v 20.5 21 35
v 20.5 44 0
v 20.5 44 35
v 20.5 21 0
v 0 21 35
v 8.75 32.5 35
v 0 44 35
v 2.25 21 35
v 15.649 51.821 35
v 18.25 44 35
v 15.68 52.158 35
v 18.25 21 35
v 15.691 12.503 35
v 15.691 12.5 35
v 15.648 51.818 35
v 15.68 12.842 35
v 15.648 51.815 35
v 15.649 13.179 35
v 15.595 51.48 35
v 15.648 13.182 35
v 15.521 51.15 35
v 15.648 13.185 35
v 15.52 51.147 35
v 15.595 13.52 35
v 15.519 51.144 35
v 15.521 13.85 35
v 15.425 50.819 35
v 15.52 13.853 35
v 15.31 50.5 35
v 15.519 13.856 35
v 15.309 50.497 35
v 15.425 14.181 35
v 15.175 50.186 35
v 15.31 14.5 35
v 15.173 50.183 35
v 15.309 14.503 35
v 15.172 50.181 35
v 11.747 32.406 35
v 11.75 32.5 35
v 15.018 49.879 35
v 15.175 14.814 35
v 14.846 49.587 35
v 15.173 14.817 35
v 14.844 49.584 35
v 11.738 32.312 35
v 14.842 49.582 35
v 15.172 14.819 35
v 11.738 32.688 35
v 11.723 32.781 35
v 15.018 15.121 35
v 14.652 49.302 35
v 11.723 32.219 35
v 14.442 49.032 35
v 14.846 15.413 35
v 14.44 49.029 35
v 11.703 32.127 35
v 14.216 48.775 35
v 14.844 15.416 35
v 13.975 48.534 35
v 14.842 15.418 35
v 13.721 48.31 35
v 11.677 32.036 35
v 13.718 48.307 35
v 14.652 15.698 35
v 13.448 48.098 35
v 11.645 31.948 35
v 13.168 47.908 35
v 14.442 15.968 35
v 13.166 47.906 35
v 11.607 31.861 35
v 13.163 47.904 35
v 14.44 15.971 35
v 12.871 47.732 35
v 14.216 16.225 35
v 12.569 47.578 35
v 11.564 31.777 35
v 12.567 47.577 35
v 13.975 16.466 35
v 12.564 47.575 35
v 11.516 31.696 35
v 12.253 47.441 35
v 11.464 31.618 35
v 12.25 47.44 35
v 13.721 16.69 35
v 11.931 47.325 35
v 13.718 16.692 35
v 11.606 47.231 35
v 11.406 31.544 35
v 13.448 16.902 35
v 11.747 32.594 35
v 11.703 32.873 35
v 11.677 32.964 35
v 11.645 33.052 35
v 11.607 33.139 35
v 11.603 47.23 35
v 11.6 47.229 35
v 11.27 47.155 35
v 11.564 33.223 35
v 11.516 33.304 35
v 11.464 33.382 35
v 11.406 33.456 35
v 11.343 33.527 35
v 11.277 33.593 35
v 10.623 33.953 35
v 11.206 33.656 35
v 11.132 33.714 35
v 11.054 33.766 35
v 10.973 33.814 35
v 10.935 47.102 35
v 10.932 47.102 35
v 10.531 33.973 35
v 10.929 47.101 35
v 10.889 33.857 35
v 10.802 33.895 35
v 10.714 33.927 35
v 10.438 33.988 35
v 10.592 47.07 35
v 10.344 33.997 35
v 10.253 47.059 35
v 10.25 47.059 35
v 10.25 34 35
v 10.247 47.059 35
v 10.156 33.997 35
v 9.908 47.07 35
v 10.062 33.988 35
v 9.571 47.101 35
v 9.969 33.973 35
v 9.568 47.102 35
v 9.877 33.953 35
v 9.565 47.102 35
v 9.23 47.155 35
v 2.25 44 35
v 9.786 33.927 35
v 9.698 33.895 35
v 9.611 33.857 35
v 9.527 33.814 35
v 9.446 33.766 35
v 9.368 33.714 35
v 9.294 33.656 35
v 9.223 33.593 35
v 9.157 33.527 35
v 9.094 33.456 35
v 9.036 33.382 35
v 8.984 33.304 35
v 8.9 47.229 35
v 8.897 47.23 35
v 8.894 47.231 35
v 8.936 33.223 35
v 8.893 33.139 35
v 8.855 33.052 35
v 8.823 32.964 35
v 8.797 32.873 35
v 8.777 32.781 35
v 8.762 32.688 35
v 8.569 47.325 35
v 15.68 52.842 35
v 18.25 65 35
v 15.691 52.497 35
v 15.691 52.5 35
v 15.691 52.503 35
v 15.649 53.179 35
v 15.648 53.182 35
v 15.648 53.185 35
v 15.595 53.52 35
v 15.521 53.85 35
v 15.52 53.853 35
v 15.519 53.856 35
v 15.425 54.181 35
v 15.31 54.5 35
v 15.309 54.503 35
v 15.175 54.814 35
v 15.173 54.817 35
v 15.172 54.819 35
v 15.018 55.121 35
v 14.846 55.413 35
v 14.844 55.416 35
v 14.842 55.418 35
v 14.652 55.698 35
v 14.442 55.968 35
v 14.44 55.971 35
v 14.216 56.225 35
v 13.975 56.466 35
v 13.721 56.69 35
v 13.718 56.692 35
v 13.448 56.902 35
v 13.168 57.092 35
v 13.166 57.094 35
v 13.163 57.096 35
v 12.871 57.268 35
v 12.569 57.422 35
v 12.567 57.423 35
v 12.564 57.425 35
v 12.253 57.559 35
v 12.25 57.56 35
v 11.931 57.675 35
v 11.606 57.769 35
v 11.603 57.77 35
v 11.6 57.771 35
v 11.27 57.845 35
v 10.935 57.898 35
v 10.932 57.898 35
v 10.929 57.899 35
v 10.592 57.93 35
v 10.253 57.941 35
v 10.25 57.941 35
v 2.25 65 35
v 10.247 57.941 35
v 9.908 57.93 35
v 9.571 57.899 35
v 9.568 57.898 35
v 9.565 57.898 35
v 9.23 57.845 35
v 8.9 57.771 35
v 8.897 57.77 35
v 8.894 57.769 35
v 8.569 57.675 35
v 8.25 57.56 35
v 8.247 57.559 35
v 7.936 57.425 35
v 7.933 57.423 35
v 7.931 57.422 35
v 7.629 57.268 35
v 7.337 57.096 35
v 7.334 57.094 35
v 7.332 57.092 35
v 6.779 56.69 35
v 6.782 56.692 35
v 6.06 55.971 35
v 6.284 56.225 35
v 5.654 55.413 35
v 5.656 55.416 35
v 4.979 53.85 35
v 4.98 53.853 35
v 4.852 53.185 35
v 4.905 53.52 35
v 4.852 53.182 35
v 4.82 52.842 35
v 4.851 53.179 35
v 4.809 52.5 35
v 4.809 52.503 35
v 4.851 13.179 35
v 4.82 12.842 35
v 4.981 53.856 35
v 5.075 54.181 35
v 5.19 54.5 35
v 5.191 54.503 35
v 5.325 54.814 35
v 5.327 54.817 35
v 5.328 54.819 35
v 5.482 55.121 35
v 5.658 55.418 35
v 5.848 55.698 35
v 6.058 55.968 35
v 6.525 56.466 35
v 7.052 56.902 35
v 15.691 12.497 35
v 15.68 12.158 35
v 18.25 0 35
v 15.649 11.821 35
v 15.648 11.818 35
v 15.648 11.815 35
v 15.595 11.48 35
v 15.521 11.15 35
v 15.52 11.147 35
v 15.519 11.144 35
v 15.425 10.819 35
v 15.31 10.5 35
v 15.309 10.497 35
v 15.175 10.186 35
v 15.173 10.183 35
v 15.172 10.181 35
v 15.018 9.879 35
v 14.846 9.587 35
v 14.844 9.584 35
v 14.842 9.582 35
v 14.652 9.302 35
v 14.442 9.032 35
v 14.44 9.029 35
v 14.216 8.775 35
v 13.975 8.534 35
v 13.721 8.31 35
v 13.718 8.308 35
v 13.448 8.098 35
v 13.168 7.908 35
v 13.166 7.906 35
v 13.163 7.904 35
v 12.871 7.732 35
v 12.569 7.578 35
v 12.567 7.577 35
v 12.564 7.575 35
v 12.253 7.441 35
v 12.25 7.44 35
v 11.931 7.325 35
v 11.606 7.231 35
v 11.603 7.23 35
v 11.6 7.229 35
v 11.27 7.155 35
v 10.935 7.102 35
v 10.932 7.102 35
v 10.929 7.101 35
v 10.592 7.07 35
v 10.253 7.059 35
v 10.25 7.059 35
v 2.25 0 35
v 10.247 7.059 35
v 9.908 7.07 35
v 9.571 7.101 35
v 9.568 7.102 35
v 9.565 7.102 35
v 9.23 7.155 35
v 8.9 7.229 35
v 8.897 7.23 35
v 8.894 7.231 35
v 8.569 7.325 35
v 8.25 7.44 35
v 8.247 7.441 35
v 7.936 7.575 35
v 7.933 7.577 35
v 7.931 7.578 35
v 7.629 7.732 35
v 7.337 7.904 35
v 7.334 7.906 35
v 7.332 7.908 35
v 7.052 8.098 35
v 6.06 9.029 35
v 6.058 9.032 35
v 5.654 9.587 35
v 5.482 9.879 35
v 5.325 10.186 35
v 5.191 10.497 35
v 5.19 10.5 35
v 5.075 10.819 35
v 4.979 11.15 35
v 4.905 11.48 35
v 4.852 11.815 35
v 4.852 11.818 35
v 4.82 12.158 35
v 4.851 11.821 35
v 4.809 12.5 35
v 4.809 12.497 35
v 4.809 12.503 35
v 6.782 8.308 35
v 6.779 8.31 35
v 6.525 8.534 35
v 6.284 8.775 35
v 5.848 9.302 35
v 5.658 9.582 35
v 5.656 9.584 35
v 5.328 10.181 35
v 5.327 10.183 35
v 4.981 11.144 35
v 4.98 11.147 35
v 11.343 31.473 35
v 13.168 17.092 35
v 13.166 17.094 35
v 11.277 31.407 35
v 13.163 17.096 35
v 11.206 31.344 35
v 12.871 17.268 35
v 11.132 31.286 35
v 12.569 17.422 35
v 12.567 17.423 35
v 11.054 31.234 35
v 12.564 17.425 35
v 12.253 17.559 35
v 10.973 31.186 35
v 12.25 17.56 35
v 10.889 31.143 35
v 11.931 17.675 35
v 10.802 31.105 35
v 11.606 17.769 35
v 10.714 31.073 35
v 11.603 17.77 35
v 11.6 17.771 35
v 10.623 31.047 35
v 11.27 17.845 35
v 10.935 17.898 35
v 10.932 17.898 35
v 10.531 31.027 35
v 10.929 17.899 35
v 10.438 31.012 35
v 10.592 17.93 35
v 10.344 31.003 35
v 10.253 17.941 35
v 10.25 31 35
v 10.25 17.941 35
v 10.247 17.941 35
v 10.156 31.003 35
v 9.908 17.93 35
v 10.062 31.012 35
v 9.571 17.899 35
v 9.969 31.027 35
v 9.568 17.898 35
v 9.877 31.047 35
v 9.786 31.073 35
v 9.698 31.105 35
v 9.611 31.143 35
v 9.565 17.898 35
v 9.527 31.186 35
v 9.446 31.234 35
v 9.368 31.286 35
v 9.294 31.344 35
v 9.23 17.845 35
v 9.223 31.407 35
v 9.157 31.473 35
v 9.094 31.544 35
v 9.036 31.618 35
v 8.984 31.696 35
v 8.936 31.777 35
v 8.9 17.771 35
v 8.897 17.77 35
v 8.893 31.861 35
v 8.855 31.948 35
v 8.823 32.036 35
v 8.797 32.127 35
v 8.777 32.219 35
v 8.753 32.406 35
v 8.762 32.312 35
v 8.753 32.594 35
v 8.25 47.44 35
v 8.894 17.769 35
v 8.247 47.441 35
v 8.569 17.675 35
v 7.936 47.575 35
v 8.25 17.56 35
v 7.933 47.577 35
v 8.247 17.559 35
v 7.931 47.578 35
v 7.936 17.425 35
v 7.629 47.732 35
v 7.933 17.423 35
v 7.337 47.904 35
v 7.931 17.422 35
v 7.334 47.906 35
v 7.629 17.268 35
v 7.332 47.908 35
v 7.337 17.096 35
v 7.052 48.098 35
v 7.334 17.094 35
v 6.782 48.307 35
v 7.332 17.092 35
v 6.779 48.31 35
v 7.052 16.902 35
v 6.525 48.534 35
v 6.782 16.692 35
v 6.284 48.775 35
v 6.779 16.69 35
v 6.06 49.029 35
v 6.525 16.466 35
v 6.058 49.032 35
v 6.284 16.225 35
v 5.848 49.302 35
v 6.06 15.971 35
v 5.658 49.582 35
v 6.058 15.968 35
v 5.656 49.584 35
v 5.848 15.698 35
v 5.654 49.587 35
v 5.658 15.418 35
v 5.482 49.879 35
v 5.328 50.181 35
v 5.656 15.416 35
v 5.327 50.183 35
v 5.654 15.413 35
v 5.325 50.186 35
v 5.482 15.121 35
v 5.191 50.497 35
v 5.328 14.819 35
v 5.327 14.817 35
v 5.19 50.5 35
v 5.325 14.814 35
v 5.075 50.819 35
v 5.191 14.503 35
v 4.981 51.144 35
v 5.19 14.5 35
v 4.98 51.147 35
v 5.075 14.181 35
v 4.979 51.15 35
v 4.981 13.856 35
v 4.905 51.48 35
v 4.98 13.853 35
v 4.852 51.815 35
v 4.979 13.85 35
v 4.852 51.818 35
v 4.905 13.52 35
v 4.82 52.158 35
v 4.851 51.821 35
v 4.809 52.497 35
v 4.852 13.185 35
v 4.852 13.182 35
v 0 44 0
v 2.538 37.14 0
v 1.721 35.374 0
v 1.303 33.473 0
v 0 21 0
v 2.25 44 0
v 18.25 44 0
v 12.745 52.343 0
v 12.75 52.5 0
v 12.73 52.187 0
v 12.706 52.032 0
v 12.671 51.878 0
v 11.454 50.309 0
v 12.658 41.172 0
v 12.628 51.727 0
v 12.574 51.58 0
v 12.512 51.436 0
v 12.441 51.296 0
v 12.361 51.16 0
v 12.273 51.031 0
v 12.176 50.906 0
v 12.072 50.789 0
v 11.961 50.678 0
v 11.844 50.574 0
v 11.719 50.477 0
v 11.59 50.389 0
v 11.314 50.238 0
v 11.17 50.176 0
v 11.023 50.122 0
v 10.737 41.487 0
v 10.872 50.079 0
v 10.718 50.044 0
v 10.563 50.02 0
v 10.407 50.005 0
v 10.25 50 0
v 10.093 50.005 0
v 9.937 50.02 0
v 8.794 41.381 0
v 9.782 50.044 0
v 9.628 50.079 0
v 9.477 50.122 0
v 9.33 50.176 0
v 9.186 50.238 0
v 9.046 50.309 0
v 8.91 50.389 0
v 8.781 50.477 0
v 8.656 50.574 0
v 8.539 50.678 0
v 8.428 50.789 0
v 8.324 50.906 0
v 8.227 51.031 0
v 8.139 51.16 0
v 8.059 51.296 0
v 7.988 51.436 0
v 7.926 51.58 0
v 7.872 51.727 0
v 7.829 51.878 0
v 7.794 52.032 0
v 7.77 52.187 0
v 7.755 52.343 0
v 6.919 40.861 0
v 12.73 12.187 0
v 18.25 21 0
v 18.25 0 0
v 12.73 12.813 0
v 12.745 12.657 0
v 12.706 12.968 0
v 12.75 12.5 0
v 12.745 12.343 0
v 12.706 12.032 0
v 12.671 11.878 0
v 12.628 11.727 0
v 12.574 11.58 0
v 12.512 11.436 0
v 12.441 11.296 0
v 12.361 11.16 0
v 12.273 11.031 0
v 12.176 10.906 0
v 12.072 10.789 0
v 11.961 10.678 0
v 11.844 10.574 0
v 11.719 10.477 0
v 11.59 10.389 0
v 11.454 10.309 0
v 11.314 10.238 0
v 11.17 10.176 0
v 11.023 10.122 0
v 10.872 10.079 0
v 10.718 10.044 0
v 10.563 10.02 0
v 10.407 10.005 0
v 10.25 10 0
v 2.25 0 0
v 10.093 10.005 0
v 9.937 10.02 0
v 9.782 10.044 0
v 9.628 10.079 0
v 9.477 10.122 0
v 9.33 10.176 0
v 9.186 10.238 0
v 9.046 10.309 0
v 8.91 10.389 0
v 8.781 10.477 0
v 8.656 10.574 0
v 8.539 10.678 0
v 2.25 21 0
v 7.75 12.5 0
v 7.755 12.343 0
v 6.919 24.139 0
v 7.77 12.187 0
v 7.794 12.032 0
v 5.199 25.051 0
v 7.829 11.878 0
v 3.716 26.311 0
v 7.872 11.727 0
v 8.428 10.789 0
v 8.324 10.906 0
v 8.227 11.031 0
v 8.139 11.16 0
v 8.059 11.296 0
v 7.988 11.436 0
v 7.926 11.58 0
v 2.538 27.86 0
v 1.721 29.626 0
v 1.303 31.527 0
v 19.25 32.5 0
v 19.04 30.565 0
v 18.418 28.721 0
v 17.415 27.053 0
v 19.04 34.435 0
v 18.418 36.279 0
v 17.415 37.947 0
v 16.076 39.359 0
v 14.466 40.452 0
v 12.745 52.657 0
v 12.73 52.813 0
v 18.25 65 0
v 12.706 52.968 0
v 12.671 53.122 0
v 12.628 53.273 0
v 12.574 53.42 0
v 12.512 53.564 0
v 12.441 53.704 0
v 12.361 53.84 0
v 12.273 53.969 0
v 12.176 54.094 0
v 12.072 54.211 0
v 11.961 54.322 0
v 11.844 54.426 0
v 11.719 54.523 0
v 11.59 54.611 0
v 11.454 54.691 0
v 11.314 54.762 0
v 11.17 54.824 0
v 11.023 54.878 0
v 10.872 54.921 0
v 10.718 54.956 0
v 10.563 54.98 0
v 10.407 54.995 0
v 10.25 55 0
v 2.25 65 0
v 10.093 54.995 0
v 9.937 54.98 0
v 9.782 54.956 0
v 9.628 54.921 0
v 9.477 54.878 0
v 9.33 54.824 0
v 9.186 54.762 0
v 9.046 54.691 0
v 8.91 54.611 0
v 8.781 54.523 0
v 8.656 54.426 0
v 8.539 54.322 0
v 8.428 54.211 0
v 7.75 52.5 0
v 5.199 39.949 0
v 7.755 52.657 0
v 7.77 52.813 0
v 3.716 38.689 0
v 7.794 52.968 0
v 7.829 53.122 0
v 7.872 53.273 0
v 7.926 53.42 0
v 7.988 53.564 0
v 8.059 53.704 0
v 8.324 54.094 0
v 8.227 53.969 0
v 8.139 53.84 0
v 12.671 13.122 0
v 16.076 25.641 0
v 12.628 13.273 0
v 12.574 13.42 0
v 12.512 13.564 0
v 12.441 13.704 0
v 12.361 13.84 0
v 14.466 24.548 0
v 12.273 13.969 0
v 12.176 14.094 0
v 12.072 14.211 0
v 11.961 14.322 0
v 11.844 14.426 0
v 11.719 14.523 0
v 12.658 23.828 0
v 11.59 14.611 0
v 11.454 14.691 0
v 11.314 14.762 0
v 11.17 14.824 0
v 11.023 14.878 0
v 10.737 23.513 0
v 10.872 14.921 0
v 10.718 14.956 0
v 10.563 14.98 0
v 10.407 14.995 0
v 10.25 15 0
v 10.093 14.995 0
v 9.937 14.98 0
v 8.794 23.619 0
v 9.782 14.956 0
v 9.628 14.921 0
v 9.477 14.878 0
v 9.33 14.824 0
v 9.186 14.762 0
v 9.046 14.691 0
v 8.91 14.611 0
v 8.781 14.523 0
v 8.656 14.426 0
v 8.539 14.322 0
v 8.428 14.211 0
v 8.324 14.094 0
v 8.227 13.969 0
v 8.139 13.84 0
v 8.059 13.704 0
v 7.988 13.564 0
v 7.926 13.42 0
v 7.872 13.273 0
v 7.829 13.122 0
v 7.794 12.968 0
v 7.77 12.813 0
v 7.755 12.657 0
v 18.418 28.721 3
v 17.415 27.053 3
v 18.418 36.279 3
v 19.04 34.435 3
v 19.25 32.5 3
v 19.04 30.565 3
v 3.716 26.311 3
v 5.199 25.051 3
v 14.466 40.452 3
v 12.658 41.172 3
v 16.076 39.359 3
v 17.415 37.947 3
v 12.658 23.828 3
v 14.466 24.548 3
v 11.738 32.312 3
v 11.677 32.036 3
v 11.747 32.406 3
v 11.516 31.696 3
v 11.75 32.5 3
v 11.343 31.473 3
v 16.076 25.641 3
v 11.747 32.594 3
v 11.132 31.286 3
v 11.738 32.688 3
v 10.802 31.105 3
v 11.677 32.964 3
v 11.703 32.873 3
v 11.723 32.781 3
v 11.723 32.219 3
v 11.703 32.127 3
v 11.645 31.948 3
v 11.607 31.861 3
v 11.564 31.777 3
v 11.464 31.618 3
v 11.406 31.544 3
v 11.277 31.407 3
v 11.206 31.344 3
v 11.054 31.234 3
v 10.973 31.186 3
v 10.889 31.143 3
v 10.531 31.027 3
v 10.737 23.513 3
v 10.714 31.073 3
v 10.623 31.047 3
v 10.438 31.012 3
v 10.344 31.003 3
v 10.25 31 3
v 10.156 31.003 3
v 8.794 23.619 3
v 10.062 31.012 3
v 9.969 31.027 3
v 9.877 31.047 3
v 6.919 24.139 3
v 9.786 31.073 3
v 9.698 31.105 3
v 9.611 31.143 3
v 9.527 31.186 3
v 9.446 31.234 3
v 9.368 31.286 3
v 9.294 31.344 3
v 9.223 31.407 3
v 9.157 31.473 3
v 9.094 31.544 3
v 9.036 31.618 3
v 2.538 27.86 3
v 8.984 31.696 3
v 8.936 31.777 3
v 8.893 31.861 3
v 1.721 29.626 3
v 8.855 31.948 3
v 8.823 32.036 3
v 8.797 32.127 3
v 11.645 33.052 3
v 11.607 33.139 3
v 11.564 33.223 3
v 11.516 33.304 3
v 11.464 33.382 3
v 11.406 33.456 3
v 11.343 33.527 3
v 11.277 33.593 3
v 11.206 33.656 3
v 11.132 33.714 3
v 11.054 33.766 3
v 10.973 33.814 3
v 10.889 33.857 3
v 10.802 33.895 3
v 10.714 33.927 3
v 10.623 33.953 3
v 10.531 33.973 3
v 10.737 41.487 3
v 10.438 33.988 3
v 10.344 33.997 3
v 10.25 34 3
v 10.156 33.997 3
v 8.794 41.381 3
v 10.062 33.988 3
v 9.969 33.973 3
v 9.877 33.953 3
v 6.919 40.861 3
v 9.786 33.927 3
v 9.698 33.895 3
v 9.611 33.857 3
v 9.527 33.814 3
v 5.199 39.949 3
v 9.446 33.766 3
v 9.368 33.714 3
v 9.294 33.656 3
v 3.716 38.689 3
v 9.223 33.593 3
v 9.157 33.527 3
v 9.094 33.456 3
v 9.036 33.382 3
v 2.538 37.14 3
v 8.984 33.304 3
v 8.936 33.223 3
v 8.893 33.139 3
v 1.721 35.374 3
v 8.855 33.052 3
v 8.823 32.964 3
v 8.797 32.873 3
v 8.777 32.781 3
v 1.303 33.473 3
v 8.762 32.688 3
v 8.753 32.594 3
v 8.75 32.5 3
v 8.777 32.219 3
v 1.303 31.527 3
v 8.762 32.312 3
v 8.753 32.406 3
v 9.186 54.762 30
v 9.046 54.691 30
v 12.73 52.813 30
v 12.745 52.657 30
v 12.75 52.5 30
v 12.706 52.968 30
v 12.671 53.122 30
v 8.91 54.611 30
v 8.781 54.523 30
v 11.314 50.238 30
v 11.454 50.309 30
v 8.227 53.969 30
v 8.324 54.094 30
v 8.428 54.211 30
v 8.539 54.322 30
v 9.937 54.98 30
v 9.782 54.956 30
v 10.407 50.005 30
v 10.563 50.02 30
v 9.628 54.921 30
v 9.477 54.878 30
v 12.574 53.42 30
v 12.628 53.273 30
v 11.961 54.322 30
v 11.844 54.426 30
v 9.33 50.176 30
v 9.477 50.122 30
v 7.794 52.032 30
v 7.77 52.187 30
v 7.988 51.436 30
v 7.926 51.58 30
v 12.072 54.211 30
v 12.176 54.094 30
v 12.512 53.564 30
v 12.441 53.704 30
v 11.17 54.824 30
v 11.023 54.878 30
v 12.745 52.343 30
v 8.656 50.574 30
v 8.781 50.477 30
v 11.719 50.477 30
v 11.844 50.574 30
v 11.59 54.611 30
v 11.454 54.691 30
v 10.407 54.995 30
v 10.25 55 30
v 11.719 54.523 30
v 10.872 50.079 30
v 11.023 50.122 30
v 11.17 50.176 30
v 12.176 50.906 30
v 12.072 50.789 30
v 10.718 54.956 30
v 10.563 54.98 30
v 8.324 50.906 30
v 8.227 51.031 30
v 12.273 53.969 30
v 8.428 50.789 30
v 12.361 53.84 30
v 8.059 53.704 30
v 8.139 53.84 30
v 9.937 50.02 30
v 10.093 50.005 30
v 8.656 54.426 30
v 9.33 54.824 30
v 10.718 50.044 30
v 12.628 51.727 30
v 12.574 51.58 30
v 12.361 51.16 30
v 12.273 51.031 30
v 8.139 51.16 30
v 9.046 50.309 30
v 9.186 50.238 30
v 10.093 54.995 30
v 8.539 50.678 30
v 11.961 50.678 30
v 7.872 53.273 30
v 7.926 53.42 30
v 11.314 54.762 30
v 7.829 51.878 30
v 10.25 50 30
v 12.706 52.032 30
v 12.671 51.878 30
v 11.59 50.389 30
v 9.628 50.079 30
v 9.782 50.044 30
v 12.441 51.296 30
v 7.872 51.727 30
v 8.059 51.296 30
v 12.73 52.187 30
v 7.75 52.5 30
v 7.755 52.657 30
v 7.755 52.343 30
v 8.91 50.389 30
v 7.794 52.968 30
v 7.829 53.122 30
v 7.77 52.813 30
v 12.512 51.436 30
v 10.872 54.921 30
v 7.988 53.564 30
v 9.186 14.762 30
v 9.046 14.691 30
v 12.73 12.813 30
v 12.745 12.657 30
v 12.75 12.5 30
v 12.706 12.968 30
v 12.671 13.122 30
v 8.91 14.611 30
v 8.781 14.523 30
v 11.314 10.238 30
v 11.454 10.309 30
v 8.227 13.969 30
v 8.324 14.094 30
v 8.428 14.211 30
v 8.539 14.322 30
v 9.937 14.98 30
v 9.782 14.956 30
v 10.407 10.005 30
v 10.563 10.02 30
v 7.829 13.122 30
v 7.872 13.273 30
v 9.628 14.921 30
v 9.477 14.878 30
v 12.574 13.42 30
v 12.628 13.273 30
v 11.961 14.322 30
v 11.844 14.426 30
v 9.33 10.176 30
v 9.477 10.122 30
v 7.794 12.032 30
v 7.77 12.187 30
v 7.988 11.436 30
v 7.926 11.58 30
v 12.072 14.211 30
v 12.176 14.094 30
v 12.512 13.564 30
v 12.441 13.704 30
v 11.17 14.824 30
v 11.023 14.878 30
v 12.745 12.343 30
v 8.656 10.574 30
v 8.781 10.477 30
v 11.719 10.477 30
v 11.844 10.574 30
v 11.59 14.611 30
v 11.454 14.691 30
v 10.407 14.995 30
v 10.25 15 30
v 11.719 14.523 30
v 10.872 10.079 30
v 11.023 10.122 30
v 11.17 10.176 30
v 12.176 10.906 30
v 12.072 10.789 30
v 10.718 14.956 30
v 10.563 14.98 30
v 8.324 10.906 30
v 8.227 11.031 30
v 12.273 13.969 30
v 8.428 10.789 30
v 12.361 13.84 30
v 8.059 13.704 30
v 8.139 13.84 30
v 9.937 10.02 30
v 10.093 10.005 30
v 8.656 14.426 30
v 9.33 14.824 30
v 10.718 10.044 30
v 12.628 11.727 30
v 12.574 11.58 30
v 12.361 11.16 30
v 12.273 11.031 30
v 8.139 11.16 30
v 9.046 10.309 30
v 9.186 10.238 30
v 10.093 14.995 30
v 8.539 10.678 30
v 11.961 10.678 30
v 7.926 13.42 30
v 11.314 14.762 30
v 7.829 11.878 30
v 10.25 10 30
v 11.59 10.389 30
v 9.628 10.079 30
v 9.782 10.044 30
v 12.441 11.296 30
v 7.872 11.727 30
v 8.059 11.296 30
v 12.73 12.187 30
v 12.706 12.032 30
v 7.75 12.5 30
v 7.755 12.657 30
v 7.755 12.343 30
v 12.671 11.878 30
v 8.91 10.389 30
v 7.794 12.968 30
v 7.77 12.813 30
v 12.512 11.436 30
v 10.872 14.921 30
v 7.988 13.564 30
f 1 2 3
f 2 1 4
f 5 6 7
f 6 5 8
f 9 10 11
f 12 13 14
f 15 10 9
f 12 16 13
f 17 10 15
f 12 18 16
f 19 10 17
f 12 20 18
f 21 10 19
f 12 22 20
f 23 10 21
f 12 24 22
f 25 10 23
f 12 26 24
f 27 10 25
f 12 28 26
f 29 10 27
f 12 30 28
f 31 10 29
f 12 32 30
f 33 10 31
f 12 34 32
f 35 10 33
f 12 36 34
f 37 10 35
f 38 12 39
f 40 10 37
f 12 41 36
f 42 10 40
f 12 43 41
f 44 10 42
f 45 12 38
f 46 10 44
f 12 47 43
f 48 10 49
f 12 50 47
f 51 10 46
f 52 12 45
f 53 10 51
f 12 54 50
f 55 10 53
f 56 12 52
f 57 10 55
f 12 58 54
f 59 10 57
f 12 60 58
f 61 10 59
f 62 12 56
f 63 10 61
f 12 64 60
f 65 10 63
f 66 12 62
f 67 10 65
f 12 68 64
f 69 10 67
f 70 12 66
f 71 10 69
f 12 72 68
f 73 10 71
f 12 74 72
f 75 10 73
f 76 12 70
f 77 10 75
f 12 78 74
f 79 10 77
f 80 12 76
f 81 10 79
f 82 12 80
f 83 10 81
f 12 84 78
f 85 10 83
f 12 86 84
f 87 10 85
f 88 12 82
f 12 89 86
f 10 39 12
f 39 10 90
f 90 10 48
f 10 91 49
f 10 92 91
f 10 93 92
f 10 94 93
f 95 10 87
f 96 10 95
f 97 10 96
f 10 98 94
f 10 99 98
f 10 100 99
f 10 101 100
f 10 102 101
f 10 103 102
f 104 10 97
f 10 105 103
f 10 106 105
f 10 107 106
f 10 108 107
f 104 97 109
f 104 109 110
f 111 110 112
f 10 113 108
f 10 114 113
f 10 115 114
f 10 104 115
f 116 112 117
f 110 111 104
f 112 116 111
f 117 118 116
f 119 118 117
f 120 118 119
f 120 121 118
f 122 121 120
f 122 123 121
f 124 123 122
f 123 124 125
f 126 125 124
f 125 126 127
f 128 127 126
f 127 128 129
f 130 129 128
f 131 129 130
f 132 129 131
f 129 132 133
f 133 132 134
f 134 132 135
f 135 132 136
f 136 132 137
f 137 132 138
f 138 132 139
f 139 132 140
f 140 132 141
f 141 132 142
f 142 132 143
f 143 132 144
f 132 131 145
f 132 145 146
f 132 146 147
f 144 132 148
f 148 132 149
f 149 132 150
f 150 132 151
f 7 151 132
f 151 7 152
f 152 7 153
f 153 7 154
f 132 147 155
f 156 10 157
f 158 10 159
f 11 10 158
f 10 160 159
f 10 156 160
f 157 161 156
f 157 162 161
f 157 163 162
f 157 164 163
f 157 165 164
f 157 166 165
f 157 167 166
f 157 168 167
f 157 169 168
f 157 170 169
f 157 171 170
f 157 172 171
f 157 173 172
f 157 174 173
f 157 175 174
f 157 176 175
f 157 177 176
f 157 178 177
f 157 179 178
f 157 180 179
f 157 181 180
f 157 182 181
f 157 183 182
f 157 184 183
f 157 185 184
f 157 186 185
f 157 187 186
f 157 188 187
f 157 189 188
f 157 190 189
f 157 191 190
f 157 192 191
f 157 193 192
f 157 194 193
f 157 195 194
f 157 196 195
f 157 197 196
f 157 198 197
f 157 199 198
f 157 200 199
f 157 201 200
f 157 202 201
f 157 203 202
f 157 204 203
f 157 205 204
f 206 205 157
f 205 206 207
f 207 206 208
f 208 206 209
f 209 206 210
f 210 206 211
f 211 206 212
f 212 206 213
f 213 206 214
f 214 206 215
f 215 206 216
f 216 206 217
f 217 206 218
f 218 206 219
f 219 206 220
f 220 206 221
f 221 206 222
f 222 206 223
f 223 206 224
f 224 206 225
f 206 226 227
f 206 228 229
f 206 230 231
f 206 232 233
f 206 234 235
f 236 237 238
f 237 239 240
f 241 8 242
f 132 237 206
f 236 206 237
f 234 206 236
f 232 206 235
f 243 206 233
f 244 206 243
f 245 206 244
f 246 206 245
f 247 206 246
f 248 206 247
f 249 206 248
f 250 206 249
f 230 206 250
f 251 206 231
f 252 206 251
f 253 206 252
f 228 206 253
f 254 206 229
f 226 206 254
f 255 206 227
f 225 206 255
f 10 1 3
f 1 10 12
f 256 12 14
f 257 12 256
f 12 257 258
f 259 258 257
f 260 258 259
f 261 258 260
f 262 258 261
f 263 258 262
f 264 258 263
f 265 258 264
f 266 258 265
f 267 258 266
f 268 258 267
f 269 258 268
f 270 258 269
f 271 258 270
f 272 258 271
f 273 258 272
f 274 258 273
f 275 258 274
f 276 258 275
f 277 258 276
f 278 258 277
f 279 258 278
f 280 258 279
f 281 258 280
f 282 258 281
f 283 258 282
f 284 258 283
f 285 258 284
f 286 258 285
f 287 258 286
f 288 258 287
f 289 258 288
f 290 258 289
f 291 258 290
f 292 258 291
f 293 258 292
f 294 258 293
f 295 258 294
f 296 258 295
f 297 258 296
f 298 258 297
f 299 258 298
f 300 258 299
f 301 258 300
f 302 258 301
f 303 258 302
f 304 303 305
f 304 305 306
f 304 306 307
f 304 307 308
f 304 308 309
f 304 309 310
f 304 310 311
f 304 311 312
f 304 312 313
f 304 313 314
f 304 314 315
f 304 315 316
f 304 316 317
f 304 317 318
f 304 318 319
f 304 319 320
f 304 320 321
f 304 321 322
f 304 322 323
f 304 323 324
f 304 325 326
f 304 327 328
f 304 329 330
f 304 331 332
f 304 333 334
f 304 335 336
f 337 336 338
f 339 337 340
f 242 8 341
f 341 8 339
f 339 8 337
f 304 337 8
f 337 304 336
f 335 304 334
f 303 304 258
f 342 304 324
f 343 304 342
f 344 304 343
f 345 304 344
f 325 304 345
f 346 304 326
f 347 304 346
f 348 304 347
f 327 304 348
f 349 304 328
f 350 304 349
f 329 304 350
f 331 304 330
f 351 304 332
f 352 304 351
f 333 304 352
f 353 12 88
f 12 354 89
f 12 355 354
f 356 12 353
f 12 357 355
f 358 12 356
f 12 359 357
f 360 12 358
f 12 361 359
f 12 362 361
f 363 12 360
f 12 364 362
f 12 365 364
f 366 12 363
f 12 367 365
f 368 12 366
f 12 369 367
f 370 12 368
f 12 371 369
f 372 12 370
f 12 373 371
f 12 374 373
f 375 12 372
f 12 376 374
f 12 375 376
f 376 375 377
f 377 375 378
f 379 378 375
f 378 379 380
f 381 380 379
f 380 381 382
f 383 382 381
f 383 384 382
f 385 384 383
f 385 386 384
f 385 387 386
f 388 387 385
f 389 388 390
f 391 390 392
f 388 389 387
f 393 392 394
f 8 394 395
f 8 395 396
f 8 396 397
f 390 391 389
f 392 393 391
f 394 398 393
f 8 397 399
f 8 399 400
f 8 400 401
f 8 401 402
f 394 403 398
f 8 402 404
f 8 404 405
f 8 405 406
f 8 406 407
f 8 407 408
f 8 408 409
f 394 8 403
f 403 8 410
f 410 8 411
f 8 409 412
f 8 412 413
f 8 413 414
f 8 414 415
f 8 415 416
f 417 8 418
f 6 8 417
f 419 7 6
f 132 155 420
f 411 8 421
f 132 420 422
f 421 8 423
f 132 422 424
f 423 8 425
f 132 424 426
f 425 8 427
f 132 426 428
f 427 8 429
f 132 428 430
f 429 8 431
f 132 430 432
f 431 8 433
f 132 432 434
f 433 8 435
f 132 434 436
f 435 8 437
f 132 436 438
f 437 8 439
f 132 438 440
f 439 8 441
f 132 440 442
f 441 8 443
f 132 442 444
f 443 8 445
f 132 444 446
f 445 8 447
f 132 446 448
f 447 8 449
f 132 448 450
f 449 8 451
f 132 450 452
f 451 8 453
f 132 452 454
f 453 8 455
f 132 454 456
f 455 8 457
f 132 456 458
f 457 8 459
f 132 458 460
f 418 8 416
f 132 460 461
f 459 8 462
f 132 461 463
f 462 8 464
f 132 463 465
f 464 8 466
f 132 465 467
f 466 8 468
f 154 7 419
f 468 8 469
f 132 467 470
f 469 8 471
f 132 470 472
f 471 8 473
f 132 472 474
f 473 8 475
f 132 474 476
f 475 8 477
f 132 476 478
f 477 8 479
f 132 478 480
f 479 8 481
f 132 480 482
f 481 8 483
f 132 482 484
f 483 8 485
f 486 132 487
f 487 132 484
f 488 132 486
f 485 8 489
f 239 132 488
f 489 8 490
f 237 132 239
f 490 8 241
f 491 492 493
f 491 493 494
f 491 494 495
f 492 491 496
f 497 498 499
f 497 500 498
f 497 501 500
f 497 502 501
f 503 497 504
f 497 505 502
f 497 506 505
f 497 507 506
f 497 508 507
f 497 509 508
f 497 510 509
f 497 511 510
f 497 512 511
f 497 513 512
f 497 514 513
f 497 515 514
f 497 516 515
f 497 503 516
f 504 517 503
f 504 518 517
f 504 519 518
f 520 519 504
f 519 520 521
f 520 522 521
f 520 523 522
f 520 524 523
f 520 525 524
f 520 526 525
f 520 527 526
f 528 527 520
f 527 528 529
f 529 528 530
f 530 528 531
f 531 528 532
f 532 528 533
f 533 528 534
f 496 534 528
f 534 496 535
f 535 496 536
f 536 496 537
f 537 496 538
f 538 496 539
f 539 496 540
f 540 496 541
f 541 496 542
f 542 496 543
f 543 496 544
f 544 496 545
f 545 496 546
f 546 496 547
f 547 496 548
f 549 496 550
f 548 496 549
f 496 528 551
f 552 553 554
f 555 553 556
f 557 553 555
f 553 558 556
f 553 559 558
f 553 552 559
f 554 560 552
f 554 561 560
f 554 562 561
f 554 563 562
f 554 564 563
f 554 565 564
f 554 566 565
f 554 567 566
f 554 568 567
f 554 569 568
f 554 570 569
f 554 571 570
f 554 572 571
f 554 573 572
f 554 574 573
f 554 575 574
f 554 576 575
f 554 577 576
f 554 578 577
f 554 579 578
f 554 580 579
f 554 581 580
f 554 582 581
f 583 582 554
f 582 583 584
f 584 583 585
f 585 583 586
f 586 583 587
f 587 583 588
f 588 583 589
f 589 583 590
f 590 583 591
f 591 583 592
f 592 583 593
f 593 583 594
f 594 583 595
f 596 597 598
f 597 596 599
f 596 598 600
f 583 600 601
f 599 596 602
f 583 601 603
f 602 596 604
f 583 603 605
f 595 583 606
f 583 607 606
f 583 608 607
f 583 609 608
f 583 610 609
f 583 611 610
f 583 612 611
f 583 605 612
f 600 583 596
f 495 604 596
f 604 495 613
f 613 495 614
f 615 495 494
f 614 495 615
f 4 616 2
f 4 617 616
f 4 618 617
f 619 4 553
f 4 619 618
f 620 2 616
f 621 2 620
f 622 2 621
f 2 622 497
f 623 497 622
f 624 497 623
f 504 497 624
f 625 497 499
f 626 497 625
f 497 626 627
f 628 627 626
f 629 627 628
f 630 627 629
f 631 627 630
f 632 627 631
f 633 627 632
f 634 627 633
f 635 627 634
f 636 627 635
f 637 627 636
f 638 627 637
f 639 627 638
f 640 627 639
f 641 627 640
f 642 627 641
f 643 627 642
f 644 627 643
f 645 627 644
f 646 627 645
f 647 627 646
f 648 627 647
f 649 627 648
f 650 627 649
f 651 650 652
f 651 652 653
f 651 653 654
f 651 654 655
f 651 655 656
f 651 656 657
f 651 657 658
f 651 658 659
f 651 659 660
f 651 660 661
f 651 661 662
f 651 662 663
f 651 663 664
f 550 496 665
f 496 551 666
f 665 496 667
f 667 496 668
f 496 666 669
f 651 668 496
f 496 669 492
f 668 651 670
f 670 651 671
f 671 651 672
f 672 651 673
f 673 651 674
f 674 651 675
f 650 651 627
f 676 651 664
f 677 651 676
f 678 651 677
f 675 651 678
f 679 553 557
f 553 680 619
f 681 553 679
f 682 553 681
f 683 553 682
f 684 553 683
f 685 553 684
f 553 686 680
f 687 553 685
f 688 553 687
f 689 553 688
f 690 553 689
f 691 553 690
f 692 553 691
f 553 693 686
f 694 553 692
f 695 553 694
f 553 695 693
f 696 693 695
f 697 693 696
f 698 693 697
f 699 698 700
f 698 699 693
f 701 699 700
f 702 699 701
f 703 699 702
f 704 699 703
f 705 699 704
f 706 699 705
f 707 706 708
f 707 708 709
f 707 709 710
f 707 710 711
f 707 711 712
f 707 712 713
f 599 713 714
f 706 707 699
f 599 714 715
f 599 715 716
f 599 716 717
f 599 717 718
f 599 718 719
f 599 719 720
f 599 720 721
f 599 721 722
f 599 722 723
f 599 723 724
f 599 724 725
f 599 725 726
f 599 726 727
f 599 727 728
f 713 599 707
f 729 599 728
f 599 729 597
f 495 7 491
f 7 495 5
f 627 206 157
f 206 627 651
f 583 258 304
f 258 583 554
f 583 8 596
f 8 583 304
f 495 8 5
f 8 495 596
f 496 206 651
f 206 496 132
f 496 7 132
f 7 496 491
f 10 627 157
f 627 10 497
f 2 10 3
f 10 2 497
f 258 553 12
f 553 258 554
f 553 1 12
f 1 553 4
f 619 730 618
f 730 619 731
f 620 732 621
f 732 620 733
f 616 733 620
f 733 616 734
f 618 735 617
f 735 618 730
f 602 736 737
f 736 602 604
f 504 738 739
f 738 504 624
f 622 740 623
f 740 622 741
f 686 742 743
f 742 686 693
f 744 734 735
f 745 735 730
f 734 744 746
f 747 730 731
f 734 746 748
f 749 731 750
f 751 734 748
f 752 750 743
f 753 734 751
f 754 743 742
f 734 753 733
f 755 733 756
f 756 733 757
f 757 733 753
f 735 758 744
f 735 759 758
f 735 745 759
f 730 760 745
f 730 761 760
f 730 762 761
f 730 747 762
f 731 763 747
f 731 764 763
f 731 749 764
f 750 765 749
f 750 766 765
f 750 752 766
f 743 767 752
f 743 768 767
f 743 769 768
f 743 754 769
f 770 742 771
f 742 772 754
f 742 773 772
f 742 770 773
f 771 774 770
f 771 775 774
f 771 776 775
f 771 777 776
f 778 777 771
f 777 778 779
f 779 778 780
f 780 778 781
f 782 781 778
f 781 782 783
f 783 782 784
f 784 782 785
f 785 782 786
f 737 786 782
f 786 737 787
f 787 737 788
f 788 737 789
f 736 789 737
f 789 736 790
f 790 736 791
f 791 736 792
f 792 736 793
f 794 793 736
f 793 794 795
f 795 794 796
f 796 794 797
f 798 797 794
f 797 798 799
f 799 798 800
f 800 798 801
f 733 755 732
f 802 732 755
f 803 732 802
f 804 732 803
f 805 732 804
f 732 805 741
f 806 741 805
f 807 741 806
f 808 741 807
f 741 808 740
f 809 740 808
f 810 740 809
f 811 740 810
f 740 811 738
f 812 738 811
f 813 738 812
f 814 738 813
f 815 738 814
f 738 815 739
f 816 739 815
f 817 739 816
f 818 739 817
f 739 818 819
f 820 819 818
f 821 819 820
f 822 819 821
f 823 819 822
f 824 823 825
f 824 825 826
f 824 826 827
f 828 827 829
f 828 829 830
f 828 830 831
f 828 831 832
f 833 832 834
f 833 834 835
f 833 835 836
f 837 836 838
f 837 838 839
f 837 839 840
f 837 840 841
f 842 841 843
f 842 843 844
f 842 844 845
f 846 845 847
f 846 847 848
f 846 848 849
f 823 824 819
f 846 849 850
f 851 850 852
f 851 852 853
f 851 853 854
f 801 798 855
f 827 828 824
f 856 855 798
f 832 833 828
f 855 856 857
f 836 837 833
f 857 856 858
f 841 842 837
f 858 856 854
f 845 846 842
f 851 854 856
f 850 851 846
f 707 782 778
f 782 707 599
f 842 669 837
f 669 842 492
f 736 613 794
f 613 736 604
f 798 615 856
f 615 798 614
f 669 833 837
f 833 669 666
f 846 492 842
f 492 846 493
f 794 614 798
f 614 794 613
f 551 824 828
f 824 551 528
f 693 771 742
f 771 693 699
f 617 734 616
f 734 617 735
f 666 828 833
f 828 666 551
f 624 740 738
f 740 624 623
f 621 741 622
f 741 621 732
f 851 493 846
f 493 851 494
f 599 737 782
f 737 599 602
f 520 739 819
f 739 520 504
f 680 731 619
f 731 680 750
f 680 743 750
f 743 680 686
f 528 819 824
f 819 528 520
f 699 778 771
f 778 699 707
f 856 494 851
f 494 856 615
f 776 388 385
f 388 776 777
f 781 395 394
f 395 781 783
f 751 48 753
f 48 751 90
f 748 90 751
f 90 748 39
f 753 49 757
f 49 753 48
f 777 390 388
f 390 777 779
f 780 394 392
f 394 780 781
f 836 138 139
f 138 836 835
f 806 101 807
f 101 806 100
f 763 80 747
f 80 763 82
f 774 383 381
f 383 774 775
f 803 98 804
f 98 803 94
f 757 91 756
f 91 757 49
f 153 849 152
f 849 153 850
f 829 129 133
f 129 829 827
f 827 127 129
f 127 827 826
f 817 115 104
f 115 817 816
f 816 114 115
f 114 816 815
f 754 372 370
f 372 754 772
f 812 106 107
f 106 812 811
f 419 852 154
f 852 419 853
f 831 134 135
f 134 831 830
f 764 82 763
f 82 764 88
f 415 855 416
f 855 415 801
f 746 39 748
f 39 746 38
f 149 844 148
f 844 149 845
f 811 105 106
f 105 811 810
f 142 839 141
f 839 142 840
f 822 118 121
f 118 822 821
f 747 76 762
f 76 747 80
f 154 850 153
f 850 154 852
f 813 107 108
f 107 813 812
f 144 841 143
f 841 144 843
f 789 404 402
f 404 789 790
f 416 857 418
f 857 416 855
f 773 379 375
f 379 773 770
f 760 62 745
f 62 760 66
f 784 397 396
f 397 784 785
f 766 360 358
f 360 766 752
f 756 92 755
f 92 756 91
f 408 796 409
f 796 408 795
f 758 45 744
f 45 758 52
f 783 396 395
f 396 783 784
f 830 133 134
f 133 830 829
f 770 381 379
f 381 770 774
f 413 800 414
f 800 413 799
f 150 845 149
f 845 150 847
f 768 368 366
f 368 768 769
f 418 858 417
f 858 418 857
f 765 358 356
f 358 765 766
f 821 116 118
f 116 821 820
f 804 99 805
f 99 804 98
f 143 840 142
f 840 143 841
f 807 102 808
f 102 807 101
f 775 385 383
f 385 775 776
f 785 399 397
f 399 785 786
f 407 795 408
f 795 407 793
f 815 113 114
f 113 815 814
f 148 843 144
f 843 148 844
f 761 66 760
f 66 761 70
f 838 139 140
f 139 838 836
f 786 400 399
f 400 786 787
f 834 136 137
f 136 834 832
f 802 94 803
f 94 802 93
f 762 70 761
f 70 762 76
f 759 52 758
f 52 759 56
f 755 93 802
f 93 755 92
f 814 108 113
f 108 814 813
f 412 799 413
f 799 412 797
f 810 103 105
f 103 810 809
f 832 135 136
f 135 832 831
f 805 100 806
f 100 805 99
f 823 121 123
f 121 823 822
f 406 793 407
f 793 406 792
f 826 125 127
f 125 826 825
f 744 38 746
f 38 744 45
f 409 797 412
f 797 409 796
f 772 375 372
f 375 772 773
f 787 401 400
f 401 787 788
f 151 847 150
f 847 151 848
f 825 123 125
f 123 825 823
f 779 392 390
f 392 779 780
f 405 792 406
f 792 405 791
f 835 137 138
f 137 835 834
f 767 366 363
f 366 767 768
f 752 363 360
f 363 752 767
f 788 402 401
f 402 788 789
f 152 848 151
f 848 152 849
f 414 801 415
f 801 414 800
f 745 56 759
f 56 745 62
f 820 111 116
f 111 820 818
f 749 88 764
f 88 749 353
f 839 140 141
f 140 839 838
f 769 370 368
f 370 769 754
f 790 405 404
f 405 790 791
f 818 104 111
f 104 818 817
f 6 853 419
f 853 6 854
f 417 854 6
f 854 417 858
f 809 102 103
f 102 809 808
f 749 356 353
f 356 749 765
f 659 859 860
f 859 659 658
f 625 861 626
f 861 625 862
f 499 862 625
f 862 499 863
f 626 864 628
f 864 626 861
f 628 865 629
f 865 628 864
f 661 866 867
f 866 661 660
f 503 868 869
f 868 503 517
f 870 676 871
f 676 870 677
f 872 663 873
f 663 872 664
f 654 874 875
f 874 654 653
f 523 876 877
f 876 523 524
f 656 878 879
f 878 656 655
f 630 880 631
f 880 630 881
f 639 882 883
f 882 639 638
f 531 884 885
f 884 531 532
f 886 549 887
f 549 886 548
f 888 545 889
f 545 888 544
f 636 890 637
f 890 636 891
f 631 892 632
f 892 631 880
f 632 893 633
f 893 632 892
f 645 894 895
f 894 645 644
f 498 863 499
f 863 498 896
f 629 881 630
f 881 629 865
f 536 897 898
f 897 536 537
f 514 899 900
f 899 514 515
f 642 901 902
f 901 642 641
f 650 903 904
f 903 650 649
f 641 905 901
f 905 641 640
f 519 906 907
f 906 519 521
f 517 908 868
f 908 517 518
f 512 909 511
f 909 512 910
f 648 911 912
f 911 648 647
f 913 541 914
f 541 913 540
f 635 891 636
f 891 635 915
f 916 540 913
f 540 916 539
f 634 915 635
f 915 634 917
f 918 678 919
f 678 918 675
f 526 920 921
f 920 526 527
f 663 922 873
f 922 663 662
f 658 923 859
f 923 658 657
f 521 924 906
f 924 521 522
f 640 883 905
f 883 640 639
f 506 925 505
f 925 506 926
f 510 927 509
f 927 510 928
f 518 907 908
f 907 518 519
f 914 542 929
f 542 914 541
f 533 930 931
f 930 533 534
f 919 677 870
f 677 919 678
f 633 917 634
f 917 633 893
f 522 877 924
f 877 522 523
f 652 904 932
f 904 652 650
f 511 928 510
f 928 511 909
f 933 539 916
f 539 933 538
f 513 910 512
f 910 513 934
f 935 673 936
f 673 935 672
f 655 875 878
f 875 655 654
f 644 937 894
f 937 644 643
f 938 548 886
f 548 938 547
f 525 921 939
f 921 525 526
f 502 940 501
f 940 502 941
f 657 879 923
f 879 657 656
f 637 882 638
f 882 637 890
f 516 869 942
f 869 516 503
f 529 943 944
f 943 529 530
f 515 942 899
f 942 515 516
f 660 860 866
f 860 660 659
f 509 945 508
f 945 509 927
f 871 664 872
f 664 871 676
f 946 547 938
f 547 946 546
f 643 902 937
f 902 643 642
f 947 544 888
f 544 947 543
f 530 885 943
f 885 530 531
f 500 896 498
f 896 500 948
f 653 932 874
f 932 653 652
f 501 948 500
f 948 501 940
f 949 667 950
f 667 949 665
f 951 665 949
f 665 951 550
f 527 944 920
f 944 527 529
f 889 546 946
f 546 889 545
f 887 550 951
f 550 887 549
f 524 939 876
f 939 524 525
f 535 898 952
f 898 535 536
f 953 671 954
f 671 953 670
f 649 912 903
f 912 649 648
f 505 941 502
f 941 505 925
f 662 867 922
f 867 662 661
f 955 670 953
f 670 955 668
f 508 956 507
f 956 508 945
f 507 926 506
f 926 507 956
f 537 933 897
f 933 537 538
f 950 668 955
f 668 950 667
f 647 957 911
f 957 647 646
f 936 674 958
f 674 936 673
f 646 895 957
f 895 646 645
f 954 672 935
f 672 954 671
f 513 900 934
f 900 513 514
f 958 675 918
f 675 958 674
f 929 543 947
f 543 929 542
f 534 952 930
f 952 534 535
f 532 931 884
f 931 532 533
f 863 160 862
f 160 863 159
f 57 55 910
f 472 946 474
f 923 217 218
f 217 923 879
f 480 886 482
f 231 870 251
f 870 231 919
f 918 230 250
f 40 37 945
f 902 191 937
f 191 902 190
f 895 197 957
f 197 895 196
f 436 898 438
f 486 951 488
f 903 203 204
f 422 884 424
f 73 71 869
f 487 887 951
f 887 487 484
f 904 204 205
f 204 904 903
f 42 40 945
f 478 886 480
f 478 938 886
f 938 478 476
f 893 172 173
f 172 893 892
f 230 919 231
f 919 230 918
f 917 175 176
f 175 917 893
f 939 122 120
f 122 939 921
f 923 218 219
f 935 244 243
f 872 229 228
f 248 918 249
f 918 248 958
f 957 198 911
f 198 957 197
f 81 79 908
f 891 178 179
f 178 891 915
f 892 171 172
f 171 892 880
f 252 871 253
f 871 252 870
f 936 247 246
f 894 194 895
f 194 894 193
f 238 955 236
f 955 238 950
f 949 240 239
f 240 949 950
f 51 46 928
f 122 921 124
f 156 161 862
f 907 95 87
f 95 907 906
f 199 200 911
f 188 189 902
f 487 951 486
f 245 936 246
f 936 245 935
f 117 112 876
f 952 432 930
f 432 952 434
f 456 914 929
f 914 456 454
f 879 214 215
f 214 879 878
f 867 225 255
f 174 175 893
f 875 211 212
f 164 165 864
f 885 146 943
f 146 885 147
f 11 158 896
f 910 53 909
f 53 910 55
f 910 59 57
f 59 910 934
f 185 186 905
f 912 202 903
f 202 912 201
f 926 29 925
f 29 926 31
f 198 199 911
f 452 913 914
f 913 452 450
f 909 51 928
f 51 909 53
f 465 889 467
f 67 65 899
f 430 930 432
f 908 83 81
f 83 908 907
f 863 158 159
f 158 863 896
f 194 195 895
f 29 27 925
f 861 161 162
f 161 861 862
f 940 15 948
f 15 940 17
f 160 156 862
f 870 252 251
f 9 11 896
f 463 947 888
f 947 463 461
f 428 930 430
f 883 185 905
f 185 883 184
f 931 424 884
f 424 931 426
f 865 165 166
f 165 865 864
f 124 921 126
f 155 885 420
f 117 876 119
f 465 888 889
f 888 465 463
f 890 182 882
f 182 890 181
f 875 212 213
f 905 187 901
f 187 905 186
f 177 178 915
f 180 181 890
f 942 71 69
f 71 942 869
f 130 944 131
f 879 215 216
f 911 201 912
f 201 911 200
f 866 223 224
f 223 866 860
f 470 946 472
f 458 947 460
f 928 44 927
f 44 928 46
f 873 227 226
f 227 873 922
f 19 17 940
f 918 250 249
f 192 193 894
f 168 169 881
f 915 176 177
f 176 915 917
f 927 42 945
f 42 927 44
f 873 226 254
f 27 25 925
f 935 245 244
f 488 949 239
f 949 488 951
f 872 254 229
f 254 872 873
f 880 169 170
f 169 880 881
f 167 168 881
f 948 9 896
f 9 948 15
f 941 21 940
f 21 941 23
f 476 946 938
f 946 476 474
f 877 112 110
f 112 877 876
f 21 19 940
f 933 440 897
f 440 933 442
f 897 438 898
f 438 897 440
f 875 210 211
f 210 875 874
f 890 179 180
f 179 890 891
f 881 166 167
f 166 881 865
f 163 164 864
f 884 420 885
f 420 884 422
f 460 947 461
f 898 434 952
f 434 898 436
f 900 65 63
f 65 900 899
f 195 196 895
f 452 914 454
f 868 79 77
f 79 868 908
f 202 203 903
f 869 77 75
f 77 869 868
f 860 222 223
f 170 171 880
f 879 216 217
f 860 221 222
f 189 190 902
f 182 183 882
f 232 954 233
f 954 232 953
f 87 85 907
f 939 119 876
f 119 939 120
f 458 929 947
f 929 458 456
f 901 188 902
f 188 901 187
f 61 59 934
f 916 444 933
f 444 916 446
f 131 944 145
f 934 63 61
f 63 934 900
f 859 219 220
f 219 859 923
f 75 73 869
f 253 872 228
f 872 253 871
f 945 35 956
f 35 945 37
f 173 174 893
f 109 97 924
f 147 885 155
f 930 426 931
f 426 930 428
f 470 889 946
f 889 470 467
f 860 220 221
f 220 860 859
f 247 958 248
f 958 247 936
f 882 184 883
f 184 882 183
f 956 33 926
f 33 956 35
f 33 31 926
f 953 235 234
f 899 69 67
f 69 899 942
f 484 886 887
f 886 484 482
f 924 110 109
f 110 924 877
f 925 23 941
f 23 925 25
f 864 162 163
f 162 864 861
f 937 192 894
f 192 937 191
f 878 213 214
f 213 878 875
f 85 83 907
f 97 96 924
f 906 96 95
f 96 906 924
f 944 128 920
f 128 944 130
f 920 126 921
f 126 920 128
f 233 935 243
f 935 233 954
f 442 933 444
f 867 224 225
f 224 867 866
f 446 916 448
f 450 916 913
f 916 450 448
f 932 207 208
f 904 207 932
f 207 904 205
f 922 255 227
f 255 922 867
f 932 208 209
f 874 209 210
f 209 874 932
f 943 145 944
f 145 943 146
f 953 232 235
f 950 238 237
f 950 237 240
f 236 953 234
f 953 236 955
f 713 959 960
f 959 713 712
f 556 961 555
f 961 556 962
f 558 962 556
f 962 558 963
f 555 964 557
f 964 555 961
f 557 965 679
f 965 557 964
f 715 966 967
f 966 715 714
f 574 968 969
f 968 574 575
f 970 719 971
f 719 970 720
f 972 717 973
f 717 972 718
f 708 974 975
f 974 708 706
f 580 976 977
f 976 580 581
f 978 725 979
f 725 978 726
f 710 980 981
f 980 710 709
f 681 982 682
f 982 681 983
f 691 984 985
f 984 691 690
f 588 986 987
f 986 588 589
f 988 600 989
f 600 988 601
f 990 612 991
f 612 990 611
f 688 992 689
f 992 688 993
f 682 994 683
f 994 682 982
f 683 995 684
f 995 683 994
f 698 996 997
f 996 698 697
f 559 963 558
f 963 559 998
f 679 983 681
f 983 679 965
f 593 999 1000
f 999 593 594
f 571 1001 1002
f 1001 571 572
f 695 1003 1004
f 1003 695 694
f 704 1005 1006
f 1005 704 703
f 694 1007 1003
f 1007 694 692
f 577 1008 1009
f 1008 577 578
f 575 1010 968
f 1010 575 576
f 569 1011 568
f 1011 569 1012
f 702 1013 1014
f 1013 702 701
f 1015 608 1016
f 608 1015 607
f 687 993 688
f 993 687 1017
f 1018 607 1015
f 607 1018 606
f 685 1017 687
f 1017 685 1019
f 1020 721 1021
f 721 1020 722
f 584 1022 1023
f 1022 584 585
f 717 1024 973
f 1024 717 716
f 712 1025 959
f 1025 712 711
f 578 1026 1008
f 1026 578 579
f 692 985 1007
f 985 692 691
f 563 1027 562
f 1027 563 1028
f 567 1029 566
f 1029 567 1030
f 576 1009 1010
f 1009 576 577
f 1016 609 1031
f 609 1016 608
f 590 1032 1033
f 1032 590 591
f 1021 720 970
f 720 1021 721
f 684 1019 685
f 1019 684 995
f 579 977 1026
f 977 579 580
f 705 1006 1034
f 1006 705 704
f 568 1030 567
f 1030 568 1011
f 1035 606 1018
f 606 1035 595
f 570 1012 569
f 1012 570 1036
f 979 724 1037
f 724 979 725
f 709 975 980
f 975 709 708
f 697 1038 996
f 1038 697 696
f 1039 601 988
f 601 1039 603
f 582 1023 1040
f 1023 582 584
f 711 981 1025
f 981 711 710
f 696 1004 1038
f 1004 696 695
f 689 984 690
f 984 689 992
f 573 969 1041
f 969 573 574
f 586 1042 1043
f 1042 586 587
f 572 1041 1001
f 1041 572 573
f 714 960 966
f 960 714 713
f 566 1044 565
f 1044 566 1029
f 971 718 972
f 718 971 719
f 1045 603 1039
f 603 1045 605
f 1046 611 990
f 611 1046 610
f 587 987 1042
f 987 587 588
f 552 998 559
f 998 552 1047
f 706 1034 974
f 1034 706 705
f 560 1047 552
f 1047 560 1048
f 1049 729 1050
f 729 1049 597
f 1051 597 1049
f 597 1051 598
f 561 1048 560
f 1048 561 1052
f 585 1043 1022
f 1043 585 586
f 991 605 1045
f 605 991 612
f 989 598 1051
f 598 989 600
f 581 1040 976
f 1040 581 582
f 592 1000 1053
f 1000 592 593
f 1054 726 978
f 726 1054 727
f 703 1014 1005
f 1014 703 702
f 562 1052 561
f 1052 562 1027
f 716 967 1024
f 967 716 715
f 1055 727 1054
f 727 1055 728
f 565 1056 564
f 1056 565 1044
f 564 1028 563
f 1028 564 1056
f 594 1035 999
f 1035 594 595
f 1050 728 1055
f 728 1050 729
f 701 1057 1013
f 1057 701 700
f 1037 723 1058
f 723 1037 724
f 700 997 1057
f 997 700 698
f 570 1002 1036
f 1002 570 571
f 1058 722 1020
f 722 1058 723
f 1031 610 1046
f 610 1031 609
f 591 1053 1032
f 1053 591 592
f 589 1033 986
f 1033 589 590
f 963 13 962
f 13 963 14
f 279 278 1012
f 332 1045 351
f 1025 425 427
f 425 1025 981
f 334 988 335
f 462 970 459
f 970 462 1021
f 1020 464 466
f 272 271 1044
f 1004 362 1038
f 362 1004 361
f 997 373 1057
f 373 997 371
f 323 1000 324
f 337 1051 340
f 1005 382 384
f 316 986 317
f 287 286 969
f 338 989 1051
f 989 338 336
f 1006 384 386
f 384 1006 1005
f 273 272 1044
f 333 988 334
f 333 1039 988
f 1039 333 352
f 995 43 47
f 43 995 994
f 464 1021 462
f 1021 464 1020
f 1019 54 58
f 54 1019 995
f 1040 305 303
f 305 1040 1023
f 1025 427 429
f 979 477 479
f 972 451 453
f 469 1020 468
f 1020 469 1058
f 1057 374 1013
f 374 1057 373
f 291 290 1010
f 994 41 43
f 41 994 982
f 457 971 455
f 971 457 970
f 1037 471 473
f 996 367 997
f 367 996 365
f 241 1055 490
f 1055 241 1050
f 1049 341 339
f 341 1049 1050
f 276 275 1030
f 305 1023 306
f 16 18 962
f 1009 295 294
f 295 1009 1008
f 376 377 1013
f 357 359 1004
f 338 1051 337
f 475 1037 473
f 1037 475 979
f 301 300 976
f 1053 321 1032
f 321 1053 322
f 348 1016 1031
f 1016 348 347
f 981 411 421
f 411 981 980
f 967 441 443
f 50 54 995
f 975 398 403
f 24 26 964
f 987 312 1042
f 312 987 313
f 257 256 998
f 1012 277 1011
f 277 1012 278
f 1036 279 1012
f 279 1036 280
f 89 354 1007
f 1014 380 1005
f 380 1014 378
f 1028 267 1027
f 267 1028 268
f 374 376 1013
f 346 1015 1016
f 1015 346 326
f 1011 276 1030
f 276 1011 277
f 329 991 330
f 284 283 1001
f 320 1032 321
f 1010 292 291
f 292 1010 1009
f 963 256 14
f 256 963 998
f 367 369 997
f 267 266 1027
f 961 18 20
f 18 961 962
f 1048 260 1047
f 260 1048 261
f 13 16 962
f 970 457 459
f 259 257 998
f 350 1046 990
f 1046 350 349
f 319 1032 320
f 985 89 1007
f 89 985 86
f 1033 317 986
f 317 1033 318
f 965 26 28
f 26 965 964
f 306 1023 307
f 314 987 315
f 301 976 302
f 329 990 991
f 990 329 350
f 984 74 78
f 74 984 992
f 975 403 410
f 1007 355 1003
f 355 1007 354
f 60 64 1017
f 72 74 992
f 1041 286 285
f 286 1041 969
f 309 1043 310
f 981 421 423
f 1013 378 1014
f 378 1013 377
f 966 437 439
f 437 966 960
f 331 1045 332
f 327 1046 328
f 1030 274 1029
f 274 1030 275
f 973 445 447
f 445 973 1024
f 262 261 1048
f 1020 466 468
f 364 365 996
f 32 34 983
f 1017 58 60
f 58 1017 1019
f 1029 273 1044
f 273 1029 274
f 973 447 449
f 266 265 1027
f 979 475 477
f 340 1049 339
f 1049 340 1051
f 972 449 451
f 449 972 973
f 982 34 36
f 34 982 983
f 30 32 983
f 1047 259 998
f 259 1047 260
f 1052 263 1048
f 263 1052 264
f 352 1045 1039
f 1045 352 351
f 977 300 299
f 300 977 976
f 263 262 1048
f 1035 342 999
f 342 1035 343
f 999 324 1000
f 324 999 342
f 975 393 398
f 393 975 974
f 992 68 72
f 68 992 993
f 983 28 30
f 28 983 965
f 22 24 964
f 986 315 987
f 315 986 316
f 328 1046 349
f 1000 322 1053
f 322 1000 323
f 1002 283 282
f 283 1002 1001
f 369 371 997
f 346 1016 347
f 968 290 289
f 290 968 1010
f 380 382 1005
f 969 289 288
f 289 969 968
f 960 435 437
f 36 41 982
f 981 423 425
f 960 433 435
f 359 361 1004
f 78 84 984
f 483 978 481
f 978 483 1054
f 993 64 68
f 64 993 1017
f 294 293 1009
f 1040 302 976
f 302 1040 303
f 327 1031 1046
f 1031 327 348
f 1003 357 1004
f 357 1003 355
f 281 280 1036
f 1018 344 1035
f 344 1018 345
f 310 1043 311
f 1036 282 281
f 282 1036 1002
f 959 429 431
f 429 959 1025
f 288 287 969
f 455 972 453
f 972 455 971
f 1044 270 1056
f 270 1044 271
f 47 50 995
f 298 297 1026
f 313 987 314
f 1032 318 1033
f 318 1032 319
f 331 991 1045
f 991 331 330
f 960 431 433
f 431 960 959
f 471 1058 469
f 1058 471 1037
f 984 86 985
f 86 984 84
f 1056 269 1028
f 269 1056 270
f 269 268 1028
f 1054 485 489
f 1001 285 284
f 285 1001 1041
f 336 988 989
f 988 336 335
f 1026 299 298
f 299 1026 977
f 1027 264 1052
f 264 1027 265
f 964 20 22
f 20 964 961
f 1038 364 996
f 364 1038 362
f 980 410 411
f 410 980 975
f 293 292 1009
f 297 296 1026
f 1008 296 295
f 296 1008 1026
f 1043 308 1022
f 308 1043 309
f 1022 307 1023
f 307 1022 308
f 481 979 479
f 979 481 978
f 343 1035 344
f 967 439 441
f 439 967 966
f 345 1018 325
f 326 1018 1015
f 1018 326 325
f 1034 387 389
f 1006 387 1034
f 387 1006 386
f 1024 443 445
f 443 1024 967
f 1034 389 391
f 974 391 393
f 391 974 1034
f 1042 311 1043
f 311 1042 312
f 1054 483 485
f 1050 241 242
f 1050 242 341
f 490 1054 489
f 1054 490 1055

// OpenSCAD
// https://github.com/jonsag/myCAD
// CADs/PipeMountDistance/PipeMountDistance.scad
// jonsagebrand@gmail.com

Distance = 35;

MinorWidth = 16;
MajorWidth = 20.5;

MinorHeight = 60;
MajorHeight = 65;

MiddleHeight = 23;

PadDiameter = 18;
PadHeight = 3;

ScrewDia = 3;

MountHoleDia = 5;

CounterSinkMajorDia = 11;
CounterSinkDepth = 5;

PipeDistance = 40;

ExtraCutOut = 10;

Roundness = 100;

// ---------- no editing below this line, if you don't know what you are doing ----------

SideCutOutWidth = (MajorWidth - MinorWidth) / 2;
SideCutOutHeight = MajorHeight / 2 - MiddleHeight / 2;

module distance() {
  difference() {

  // Body
    translate([0, 0, 0])
      cube([MajorWidth, MajorHeight, Distance]);

      // Side Cut Out 1
    color(c = "red")
      translate([-ExtraCutOut, -ExtraCutOut, -ExtraCutOut / 2])
        cube([SideCutOutWidth + ExtraCutOut, SideCutOutHeight + ExtraCutOut, Distance + ExtraCutOut]);

        // Side Cut Out 2
    color(c = "red")
      translate([-ExtraCutOut, MajorHeight - SideCutOutHeight, -ExtraCutOut / 2])
        cube([SideCutOutWidth + ExtraCutOut, SideCutOutHeight + ExtraCutOut, Distance + ExtraCutOut]);

        // Side Cut Out 3
    color(c = "red")
      translate([MajorWidth - (MajorWidth - MinorWidth) / 2, MajorHeight - SideCutOutHeight, -ExtraCutOut / 2])
        cube([SideCutOutWidth + ExtraCutOut, SideCutOutHeight + ExtraCutOut, Distance + ExtraCutOut]);

        // Side Cut Out 4
    color(c = "red")
      translate([MajorWidth - (MajorWidth - MinorWidth) / 2, -ExtraCutOut, -ExtraCutOut / 2])
        cube([SideCutOutWidth + ExtraCutOut, SideCutOutHeight + ExtraCutOut, Distance + ExtraCutOut]);

        // Pad
    color(c = "red")
      translate([MajorWidth / 2, MajorHeight / 2, -ExtraCutOut])
        cylinder(d = PadDiameter, h = PadHeight + ExtraCutOut);

        // Center Hole
    color(c = "green")
      translate([MajorWidth / 2, MajorHeight / 2, -ExtraCutOut / 2])
        cylinder(d = ScrewDia, h = Distance + ExtraCutOut, $fn = Roundness);

        // Mount Hole 1
    color(c = "orange")
      translate([MajorWidth / 2, MajorHeight / 2 + PipeDistance / 2, -ExtraCutOut / 2])
        cylinder(d = MountHoleDia, h = Distance + ExtraCutOut, $fn = Roundness);

    color(c = "blue")
      translate([MajorWidth / 2, MajorHeight / 2 + PipeDistance / 2, Distance - CounterSinkDepth])
        cylinder(h = CounterSinkDepth + 0.1, d2 = CounterSinkMajorDia, d1 = MountHoleDia, $fn = Roundness);

        // Mount Hole 2
    color(c = "orange")
      translate([MajorWidth / 2, MajorHeight / 2 - PipeDistance / 2, -ExtraCutOut / 2])
        cylinder(d = MountHoleDia, h = Distance + ExtraCutOut, $fn = Roundness);

    color(c = "blue")
      translate([MajorWidth / 2, MajorHeight / 2 - PipeDistance / 2, Distance - CounterSinkDepth])
        cylinder(h = CounterSinkDepth + 0.1, d2 = CounterSinkMajorDia, d1 = MountHoleDia, $fn = Roundness);
  }
}

//if ($preview)
distance();
